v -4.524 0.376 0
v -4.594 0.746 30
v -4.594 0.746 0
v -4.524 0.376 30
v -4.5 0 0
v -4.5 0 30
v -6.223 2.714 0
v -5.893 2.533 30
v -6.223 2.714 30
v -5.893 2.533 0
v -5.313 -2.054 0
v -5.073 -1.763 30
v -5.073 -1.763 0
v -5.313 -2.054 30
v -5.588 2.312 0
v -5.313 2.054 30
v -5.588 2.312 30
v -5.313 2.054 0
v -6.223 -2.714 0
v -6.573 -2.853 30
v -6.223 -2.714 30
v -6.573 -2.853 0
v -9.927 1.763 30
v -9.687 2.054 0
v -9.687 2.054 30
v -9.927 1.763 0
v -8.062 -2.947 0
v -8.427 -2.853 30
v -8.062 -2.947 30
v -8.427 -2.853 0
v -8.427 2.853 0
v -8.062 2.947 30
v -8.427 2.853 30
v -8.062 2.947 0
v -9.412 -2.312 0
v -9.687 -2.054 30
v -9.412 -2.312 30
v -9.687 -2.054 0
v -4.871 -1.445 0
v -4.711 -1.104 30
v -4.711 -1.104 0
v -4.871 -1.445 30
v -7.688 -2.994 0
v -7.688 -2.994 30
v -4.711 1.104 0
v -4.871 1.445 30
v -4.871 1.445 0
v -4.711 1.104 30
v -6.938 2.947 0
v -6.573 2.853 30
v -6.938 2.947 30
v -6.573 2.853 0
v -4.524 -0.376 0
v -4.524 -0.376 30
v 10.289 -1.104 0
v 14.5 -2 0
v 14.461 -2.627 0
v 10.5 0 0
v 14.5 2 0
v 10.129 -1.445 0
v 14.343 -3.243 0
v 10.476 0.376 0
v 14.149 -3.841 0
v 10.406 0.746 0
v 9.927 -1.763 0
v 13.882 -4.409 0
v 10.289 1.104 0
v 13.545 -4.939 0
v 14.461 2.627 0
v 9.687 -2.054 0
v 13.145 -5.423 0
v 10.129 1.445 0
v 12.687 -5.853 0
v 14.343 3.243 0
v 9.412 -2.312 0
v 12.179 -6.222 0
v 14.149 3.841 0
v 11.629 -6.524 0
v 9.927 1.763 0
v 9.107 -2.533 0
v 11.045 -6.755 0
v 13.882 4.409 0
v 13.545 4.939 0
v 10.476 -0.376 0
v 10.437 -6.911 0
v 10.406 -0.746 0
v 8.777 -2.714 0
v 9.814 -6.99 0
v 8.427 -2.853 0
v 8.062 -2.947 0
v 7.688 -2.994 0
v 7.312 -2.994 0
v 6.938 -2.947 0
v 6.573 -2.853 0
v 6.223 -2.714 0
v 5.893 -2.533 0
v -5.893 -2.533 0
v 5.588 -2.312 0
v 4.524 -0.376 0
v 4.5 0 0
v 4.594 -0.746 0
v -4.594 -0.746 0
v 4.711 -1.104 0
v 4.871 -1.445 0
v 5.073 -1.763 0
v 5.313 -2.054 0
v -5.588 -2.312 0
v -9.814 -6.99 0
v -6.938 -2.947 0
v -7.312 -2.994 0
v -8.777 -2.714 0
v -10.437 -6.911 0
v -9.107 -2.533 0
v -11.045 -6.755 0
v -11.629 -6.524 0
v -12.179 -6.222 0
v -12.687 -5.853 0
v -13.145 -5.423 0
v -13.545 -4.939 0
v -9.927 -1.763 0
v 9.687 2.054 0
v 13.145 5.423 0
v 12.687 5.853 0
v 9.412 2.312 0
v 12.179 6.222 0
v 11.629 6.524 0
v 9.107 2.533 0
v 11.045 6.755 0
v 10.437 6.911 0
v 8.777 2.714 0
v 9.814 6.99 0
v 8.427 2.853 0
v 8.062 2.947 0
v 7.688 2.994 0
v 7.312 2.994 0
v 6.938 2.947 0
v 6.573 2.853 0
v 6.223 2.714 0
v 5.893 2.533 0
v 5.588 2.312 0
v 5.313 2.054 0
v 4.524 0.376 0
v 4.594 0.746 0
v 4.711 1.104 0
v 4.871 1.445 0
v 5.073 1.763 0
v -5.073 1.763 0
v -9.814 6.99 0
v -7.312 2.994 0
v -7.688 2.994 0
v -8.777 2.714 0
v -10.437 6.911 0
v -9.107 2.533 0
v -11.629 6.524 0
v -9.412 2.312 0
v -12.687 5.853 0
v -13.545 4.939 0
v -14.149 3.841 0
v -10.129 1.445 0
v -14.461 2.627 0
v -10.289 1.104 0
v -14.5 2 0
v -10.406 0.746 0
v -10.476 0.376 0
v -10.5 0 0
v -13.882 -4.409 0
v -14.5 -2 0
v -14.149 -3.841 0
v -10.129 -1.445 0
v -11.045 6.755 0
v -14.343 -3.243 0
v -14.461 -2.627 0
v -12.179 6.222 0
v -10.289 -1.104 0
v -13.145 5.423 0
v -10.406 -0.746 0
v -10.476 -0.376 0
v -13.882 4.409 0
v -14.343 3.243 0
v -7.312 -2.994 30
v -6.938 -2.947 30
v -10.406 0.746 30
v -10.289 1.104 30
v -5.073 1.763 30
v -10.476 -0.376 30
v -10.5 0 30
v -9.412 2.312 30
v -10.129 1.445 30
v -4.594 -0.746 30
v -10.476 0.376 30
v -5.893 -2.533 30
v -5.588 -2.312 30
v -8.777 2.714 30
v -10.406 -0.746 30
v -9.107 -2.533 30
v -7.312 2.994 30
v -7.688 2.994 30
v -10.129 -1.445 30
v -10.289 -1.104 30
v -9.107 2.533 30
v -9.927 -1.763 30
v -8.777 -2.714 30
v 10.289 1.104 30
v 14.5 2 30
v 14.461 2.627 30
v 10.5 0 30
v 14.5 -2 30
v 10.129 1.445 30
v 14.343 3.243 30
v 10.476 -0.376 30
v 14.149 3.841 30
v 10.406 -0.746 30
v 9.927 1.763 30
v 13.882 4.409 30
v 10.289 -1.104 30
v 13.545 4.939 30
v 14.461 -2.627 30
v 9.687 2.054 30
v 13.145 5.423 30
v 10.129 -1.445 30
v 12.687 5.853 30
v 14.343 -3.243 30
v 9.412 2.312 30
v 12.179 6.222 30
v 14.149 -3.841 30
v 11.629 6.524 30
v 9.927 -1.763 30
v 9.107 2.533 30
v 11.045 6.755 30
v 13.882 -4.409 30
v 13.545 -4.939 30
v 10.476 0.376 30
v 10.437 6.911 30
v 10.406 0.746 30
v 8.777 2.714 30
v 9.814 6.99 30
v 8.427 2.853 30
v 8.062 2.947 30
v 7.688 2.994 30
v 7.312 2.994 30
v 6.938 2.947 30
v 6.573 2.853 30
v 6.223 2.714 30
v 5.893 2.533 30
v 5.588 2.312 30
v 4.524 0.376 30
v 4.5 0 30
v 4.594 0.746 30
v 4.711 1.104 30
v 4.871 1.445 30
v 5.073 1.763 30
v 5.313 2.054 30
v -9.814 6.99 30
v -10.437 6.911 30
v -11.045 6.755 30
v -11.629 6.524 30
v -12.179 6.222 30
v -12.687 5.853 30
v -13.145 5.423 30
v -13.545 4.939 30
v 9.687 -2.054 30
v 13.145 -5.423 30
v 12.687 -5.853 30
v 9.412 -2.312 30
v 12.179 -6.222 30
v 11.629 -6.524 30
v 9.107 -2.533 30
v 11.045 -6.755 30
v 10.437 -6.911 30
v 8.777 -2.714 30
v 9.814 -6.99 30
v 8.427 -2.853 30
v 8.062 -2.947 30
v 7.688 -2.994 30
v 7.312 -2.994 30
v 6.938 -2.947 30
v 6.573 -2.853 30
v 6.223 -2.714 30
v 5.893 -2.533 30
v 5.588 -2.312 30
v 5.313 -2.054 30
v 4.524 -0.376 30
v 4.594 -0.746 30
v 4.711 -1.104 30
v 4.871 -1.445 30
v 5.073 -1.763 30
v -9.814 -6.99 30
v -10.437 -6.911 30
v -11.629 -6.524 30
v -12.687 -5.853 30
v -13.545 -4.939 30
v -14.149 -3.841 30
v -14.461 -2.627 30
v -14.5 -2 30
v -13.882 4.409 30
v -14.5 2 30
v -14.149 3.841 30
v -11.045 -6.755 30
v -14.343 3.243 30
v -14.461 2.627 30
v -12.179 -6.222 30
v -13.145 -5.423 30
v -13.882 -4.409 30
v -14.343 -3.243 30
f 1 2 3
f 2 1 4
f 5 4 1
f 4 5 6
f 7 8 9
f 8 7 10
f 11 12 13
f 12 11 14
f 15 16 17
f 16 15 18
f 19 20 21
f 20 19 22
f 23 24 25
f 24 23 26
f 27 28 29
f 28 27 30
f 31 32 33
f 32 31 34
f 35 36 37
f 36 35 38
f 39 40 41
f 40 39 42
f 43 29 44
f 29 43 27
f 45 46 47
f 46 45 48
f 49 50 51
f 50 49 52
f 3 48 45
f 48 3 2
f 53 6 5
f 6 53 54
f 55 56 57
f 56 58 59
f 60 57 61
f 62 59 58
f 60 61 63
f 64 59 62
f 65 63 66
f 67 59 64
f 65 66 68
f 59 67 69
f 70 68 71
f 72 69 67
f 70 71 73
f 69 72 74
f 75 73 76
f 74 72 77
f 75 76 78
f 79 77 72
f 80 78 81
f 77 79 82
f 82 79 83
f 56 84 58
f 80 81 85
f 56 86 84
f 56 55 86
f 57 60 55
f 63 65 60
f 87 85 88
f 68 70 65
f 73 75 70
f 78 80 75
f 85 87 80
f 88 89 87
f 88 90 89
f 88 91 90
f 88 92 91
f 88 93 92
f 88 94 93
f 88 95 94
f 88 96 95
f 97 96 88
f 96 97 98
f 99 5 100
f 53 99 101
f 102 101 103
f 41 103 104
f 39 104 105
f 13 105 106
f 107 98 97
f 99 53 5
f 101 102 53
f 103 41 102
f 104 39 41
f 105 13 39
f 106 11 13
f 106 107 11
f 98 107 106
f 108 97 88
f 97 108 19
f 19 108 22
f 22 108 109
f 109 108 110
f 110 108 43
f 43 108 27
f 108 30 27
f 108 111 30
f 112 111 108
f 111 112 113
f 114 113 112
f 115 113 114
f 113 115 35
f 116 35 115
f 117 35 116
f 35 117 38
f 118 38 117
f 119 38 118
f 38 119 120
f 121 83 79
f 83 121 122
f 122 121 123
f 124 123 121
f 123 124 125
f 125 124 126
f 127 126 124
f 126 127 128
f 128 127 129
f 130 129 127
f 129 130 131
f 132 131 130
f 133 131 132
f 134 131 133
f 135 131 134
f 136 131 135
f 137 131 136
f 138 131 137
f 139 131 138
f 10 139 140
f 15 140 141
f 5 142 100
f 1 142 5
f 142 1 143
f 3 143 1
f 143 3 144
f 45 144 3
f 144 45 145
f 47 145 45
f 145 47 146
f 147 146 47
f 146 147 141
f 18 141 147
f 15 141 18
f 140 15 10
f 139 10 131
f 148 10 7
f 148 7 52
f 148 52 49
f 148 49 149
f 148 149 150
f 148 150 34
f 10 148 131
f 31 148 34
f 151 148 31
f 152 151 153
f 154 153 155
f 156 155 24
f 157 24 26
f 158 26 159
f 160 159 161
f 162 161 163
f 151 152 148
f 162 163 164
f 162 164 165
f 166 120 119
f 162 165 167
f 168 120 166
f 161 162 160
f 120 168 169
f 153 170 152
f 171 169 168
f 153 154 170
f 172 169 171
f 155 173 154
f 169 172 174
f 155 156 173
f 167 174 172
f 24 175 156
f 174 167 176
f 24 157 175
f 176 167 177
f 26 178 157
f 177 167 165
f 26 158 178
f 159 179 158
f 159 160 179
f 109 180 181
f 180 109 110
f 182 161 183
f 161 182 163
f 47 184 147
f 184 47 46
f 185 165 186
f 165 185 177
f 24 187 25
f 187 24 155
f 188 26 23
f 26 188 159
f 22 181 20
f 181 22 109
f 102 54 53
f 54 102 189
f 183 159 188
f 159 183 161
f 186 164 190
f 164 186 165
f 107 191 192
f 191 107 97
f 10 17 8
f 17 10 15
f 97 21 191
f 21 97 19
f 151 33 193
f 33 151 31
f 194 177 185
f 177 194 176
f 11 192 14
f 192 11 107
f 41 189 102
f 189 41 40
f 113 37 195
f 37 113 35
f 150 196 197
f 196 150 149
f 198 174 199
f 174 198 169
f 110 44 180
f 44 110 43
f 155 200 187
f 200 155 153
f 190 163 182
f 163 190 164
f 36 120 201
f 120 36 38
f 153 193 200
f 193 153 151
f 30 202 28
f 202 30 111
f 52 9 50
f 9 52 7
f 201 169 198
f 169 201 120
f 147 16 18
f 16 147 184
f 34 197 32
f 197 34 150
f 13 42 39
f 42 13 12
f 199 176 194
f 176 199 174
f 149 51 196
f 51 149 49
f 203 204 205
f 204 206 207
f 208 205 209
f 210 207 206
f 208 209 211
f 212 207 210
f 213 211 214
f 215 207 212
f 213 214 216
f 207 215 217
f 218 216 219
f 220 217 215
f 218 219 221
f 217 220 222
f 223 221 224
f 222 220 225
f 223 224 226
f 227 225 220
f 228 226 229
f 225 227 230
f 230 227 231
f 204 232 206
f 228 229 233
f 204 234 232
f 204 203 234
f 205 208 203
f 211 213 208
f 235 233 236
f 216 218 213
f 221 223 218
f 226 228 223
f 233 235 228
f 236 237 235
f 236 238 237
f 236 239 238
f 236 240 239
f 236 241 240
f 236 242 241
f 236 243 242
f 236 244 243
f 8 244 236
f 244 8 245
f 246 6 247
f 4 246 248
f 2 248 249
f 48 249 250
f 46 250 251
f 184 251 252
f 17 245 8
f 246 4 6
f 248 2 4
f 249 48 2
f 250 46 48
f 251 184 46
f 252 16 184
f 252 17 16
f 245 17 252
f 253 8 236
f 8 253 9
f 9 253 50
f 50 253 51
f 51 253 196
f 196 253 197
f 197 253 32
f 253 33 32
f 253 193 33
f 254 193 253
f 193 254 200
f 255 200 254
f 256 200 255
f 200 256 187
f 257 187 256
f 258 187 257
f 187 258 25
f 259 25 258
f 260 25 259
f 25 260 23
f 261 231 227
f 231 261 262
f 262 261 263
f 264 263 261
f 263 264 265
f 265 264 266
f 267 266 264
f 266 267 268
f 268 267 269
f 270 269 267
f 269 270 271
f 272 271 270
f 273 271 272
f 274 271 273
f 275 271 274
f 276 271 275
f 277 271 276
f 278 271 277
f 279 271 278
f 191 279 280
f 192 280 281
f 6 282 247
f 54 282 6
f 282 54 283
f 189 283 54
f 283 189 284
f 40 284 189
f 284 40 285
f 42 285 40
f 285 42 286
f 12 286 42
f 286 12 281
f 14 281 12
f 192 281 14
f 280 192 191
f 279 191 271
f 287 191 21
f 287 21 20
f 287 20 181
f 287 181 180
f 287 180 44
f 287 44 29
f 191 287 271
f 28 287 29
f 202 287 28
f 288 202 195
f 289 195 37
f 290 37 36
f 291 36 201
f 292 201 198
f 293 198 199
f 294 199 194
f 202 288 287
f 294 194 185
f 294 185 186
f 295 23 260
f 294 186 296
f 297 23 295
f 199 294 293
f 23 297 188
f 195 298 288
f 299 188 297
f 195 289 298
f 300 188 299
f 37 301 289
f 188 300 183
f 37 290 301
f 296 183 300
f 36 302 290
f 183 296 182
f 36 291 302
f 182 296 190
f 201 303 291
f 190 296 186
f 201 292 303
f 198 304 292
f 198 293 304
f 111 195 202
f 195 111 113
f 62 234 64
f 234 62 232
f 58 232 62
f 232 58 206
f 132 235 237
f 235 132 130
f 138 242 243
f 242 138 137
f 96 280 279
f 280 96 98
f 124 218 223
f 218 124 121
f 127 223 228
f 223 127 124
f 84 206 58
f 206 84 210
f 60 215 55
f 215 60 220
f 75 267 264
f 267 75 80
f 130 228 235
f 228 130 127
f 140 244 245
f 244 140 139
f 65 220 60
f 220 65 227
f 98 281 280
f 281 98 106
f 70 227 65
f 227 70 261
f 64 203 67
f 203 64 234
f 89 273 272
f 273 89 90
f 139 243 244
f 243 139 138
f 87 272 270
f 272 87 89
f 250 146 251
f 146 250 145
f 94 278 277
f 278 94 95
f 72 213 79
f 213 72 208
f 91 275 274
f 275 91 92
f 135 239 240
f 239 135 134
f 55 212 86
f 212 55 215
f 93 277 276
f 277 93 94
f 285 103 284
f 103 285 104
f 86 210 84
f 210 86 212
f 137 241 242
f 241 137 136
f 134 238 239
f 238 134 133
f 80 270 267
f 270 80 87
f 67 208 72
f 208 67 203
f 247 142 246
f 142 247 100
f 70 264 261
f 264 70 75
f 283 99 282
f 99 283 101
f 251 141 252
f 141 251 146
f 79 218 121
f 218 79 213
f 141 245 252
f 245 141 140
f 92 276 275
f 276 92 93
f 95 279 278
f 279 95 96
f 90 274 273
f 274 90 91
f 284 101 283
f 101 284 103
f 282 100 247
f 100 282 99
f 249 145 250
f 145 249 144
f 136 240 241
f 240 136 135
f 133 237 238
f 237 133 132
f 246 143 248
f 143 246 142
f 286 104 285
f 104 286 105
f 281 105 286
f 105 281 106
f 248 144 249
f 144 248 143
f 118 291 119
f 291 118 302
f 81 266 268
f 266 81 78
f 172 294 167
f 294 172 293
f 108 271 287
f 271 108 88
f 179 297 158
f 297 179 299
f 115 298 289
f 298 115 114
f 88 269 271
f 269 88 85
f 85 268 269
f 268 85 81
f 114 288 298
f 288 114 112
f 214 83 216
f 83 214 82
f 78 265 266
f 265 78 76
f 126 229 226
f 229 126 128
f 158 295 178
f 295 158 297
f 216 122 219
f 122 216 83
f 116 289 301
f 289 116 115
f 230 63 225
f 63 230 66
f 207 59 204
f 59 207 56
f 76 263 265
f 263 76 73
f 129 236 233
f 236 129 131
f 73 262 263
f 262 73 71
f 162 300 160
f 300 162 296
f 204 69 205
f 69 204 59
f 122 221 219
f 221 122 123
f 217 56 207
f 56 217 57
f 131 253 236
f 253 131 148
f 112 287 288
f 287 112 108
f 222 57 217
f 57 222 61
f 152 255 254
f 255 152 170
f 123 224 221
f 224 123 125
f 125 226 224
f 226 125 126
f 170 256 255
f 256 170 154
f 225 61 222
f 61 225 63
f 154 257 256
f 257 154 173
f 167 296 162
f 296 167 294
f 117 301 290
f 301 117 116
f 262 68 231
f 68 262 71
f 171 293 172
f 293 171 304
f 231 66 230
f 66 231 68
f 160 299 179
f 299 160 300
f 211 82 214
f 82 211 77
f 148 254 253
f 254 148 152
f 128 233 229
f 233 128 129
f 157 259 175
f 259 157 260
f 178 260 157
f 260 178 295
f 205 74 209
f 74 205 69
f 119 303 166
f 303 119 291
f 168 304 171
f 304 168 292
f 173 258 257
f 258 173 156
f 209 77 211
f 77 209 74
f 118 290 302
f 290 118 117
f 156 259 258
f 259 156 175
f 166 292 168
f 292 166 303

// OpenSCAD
$fn = 50;


difference() {
	union() {
		hull() {
			translate(v = [-9.5000000000, 2.0000000000, 0]) {
				cylinder(h = 30, r = 5);
			}
			translate(v = [9.5000000000, 2.0000000000, 0]) {
				cylinder(h = 30, r = 5);
			}
			translate(v = [-9.5000000000, -2.0000000000, 0]) {
				cylinder(h = 30, r = 5);
			}
			translate(v = [9.5000000000, -2.0000000000, 0]) {
				cylinder(h = 30, r = 5);
			}
		}
	}
	union() {
		translate(v = [-7.5000000000, 0.0000000000, 0]) {
			cylinder(h = 30, r = 3.0000000000);
		}
		translate(v = [7.5000000000, 0.0000000000, 0]) {
			cylinder(h = 30, r = 3.0000000000);
		}
		translate(v = [-7.5000000000, 0.0000000000, 0]) {
			cylinder(h = 30, r = 1.5000000000);
		}
		translate(v = [7.5000000000, 0.0000000000, 0]) {
			cylinder(h = 30, r = 1.5000000000);
		}
		translate(v = [-7.5000000000, 0.0000000000, 0]) {
			cylinder(h = 30, r = 1.5000000000);
		}
		translate(v = [7.5000000000, 0.0000000000, 0]) {
			cylinder(h = 30, r = 1.5000000000);
		}
		translate(v = [-7.5000000000, 0.0000000000, 0]) {
			cylinder(h = 30, r = 1.5000000000);
		}
		translate(v = [7.5000000000, 0.0000000000, 0]) {
			cylinder(h = 30, r = 1.5000000000);
		}
	}
}
